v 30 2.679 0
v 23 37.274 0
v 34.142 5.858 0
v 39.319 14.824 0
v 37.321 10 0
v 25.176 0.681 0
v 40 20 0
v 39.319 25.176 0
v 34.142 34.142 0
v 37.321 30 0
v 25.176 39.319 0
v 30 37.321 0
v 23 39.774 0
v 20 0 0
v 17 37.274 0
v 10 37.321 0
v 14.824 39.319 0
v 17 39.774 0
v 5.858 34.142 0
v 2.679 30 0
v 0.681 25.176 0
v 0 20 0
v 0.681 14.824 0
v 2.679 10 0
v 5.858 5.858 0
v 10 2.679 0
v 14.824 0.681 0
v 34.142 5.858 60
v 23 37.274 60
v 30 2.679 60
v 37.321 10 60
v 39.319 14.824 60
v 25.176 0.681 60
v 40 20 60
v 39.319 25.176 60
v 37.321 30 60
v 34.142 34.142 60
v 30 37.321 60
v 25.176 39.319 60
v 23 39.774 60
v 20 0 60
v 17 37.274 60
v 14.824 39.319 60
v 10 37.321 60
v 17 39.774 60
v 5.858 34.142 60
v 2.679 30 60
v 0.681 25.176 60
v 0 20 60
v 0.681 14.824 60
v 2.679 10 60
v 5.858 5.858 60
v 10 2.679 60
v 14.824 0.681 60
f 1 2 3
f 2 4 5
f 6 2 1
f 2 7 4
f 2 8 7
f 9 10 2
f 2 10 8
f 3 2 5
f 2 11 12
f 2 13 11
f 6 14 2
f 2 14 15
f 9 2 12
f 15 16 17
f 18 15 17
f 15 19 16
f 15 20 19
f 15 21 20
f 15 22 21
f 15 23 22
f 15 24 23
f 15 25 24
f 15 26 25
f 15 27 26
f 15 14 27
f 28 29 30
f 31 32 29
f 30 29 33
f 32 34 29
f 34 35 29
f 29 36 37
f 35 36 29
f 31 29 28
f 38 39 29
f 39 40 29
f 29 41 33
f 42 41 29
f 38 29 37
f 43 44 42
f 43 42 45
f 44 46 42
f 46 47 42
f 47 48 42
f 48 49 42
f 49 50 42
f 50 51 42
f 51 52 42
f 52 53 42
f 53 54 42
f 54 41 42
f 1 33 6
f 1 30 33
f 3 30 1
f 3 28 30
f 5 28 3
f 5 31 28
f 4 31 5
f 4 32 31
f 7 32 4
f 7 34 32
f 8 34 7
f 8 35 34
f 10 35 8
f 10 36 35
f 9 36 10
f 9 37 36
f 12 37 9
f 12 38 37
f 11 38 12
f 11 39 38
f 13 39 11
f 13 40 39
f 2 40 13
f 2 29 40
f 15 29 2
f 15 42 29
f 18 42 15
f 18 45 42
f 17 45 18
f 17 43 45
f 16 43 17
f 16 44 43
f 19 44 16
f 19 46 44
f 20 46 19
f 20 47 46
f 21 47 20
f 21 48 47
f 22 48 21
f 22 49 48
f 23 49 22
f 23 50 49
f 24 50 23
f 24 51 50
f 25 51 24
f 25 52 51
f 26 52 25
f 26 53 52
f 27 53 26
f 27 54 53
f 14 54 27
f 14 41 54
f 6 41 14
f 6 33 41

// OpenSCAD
$fn = 32;

// ----------------------------------------------------------------------
// Keyway shaft: d40 shaft, key 6 x 2.5 mm
// ----------------------------------------------------------------------

// --- parameters (mm) ---
shaft_r = 20;             // shaft radius
key_w = 6;                // keyway width
key_d = 2.5;              // keyway depth below the surface line
plate_t = 60;             // shaft length, Z (extrusion height)

shaft_d = 2 * shaft_r;  // shaft diameter
circle_step = 15;  // polygon sampling step, degrees

profile = [[14.824, 39.319], [10, 37.321], [5.858, 34.142], [2.679, 30], [0.681, 25.176], [0, 20], [0.681, 14.824], [2.679, 10], [5.858, 5.858], [10, 2.679], [14.824, 0.681], [20, 0], [25.176, 0.681], [30, 2.679], [34.142, 5.858], [37.321, 10], [39.319, 14.824], [40, 20], [39.319, 25.176], [37.321, 30], [34.142, 34.142], [30, 37.321], [25.176, 39.319], [23, 39.774], [23, 37.274], [17, 37.274], [17, 39.774]];  // primary outline, 27 points, counter clockwise

// --- the one profile operation ---
linear_extrude(height = plate_t) polygon(points = profile);
